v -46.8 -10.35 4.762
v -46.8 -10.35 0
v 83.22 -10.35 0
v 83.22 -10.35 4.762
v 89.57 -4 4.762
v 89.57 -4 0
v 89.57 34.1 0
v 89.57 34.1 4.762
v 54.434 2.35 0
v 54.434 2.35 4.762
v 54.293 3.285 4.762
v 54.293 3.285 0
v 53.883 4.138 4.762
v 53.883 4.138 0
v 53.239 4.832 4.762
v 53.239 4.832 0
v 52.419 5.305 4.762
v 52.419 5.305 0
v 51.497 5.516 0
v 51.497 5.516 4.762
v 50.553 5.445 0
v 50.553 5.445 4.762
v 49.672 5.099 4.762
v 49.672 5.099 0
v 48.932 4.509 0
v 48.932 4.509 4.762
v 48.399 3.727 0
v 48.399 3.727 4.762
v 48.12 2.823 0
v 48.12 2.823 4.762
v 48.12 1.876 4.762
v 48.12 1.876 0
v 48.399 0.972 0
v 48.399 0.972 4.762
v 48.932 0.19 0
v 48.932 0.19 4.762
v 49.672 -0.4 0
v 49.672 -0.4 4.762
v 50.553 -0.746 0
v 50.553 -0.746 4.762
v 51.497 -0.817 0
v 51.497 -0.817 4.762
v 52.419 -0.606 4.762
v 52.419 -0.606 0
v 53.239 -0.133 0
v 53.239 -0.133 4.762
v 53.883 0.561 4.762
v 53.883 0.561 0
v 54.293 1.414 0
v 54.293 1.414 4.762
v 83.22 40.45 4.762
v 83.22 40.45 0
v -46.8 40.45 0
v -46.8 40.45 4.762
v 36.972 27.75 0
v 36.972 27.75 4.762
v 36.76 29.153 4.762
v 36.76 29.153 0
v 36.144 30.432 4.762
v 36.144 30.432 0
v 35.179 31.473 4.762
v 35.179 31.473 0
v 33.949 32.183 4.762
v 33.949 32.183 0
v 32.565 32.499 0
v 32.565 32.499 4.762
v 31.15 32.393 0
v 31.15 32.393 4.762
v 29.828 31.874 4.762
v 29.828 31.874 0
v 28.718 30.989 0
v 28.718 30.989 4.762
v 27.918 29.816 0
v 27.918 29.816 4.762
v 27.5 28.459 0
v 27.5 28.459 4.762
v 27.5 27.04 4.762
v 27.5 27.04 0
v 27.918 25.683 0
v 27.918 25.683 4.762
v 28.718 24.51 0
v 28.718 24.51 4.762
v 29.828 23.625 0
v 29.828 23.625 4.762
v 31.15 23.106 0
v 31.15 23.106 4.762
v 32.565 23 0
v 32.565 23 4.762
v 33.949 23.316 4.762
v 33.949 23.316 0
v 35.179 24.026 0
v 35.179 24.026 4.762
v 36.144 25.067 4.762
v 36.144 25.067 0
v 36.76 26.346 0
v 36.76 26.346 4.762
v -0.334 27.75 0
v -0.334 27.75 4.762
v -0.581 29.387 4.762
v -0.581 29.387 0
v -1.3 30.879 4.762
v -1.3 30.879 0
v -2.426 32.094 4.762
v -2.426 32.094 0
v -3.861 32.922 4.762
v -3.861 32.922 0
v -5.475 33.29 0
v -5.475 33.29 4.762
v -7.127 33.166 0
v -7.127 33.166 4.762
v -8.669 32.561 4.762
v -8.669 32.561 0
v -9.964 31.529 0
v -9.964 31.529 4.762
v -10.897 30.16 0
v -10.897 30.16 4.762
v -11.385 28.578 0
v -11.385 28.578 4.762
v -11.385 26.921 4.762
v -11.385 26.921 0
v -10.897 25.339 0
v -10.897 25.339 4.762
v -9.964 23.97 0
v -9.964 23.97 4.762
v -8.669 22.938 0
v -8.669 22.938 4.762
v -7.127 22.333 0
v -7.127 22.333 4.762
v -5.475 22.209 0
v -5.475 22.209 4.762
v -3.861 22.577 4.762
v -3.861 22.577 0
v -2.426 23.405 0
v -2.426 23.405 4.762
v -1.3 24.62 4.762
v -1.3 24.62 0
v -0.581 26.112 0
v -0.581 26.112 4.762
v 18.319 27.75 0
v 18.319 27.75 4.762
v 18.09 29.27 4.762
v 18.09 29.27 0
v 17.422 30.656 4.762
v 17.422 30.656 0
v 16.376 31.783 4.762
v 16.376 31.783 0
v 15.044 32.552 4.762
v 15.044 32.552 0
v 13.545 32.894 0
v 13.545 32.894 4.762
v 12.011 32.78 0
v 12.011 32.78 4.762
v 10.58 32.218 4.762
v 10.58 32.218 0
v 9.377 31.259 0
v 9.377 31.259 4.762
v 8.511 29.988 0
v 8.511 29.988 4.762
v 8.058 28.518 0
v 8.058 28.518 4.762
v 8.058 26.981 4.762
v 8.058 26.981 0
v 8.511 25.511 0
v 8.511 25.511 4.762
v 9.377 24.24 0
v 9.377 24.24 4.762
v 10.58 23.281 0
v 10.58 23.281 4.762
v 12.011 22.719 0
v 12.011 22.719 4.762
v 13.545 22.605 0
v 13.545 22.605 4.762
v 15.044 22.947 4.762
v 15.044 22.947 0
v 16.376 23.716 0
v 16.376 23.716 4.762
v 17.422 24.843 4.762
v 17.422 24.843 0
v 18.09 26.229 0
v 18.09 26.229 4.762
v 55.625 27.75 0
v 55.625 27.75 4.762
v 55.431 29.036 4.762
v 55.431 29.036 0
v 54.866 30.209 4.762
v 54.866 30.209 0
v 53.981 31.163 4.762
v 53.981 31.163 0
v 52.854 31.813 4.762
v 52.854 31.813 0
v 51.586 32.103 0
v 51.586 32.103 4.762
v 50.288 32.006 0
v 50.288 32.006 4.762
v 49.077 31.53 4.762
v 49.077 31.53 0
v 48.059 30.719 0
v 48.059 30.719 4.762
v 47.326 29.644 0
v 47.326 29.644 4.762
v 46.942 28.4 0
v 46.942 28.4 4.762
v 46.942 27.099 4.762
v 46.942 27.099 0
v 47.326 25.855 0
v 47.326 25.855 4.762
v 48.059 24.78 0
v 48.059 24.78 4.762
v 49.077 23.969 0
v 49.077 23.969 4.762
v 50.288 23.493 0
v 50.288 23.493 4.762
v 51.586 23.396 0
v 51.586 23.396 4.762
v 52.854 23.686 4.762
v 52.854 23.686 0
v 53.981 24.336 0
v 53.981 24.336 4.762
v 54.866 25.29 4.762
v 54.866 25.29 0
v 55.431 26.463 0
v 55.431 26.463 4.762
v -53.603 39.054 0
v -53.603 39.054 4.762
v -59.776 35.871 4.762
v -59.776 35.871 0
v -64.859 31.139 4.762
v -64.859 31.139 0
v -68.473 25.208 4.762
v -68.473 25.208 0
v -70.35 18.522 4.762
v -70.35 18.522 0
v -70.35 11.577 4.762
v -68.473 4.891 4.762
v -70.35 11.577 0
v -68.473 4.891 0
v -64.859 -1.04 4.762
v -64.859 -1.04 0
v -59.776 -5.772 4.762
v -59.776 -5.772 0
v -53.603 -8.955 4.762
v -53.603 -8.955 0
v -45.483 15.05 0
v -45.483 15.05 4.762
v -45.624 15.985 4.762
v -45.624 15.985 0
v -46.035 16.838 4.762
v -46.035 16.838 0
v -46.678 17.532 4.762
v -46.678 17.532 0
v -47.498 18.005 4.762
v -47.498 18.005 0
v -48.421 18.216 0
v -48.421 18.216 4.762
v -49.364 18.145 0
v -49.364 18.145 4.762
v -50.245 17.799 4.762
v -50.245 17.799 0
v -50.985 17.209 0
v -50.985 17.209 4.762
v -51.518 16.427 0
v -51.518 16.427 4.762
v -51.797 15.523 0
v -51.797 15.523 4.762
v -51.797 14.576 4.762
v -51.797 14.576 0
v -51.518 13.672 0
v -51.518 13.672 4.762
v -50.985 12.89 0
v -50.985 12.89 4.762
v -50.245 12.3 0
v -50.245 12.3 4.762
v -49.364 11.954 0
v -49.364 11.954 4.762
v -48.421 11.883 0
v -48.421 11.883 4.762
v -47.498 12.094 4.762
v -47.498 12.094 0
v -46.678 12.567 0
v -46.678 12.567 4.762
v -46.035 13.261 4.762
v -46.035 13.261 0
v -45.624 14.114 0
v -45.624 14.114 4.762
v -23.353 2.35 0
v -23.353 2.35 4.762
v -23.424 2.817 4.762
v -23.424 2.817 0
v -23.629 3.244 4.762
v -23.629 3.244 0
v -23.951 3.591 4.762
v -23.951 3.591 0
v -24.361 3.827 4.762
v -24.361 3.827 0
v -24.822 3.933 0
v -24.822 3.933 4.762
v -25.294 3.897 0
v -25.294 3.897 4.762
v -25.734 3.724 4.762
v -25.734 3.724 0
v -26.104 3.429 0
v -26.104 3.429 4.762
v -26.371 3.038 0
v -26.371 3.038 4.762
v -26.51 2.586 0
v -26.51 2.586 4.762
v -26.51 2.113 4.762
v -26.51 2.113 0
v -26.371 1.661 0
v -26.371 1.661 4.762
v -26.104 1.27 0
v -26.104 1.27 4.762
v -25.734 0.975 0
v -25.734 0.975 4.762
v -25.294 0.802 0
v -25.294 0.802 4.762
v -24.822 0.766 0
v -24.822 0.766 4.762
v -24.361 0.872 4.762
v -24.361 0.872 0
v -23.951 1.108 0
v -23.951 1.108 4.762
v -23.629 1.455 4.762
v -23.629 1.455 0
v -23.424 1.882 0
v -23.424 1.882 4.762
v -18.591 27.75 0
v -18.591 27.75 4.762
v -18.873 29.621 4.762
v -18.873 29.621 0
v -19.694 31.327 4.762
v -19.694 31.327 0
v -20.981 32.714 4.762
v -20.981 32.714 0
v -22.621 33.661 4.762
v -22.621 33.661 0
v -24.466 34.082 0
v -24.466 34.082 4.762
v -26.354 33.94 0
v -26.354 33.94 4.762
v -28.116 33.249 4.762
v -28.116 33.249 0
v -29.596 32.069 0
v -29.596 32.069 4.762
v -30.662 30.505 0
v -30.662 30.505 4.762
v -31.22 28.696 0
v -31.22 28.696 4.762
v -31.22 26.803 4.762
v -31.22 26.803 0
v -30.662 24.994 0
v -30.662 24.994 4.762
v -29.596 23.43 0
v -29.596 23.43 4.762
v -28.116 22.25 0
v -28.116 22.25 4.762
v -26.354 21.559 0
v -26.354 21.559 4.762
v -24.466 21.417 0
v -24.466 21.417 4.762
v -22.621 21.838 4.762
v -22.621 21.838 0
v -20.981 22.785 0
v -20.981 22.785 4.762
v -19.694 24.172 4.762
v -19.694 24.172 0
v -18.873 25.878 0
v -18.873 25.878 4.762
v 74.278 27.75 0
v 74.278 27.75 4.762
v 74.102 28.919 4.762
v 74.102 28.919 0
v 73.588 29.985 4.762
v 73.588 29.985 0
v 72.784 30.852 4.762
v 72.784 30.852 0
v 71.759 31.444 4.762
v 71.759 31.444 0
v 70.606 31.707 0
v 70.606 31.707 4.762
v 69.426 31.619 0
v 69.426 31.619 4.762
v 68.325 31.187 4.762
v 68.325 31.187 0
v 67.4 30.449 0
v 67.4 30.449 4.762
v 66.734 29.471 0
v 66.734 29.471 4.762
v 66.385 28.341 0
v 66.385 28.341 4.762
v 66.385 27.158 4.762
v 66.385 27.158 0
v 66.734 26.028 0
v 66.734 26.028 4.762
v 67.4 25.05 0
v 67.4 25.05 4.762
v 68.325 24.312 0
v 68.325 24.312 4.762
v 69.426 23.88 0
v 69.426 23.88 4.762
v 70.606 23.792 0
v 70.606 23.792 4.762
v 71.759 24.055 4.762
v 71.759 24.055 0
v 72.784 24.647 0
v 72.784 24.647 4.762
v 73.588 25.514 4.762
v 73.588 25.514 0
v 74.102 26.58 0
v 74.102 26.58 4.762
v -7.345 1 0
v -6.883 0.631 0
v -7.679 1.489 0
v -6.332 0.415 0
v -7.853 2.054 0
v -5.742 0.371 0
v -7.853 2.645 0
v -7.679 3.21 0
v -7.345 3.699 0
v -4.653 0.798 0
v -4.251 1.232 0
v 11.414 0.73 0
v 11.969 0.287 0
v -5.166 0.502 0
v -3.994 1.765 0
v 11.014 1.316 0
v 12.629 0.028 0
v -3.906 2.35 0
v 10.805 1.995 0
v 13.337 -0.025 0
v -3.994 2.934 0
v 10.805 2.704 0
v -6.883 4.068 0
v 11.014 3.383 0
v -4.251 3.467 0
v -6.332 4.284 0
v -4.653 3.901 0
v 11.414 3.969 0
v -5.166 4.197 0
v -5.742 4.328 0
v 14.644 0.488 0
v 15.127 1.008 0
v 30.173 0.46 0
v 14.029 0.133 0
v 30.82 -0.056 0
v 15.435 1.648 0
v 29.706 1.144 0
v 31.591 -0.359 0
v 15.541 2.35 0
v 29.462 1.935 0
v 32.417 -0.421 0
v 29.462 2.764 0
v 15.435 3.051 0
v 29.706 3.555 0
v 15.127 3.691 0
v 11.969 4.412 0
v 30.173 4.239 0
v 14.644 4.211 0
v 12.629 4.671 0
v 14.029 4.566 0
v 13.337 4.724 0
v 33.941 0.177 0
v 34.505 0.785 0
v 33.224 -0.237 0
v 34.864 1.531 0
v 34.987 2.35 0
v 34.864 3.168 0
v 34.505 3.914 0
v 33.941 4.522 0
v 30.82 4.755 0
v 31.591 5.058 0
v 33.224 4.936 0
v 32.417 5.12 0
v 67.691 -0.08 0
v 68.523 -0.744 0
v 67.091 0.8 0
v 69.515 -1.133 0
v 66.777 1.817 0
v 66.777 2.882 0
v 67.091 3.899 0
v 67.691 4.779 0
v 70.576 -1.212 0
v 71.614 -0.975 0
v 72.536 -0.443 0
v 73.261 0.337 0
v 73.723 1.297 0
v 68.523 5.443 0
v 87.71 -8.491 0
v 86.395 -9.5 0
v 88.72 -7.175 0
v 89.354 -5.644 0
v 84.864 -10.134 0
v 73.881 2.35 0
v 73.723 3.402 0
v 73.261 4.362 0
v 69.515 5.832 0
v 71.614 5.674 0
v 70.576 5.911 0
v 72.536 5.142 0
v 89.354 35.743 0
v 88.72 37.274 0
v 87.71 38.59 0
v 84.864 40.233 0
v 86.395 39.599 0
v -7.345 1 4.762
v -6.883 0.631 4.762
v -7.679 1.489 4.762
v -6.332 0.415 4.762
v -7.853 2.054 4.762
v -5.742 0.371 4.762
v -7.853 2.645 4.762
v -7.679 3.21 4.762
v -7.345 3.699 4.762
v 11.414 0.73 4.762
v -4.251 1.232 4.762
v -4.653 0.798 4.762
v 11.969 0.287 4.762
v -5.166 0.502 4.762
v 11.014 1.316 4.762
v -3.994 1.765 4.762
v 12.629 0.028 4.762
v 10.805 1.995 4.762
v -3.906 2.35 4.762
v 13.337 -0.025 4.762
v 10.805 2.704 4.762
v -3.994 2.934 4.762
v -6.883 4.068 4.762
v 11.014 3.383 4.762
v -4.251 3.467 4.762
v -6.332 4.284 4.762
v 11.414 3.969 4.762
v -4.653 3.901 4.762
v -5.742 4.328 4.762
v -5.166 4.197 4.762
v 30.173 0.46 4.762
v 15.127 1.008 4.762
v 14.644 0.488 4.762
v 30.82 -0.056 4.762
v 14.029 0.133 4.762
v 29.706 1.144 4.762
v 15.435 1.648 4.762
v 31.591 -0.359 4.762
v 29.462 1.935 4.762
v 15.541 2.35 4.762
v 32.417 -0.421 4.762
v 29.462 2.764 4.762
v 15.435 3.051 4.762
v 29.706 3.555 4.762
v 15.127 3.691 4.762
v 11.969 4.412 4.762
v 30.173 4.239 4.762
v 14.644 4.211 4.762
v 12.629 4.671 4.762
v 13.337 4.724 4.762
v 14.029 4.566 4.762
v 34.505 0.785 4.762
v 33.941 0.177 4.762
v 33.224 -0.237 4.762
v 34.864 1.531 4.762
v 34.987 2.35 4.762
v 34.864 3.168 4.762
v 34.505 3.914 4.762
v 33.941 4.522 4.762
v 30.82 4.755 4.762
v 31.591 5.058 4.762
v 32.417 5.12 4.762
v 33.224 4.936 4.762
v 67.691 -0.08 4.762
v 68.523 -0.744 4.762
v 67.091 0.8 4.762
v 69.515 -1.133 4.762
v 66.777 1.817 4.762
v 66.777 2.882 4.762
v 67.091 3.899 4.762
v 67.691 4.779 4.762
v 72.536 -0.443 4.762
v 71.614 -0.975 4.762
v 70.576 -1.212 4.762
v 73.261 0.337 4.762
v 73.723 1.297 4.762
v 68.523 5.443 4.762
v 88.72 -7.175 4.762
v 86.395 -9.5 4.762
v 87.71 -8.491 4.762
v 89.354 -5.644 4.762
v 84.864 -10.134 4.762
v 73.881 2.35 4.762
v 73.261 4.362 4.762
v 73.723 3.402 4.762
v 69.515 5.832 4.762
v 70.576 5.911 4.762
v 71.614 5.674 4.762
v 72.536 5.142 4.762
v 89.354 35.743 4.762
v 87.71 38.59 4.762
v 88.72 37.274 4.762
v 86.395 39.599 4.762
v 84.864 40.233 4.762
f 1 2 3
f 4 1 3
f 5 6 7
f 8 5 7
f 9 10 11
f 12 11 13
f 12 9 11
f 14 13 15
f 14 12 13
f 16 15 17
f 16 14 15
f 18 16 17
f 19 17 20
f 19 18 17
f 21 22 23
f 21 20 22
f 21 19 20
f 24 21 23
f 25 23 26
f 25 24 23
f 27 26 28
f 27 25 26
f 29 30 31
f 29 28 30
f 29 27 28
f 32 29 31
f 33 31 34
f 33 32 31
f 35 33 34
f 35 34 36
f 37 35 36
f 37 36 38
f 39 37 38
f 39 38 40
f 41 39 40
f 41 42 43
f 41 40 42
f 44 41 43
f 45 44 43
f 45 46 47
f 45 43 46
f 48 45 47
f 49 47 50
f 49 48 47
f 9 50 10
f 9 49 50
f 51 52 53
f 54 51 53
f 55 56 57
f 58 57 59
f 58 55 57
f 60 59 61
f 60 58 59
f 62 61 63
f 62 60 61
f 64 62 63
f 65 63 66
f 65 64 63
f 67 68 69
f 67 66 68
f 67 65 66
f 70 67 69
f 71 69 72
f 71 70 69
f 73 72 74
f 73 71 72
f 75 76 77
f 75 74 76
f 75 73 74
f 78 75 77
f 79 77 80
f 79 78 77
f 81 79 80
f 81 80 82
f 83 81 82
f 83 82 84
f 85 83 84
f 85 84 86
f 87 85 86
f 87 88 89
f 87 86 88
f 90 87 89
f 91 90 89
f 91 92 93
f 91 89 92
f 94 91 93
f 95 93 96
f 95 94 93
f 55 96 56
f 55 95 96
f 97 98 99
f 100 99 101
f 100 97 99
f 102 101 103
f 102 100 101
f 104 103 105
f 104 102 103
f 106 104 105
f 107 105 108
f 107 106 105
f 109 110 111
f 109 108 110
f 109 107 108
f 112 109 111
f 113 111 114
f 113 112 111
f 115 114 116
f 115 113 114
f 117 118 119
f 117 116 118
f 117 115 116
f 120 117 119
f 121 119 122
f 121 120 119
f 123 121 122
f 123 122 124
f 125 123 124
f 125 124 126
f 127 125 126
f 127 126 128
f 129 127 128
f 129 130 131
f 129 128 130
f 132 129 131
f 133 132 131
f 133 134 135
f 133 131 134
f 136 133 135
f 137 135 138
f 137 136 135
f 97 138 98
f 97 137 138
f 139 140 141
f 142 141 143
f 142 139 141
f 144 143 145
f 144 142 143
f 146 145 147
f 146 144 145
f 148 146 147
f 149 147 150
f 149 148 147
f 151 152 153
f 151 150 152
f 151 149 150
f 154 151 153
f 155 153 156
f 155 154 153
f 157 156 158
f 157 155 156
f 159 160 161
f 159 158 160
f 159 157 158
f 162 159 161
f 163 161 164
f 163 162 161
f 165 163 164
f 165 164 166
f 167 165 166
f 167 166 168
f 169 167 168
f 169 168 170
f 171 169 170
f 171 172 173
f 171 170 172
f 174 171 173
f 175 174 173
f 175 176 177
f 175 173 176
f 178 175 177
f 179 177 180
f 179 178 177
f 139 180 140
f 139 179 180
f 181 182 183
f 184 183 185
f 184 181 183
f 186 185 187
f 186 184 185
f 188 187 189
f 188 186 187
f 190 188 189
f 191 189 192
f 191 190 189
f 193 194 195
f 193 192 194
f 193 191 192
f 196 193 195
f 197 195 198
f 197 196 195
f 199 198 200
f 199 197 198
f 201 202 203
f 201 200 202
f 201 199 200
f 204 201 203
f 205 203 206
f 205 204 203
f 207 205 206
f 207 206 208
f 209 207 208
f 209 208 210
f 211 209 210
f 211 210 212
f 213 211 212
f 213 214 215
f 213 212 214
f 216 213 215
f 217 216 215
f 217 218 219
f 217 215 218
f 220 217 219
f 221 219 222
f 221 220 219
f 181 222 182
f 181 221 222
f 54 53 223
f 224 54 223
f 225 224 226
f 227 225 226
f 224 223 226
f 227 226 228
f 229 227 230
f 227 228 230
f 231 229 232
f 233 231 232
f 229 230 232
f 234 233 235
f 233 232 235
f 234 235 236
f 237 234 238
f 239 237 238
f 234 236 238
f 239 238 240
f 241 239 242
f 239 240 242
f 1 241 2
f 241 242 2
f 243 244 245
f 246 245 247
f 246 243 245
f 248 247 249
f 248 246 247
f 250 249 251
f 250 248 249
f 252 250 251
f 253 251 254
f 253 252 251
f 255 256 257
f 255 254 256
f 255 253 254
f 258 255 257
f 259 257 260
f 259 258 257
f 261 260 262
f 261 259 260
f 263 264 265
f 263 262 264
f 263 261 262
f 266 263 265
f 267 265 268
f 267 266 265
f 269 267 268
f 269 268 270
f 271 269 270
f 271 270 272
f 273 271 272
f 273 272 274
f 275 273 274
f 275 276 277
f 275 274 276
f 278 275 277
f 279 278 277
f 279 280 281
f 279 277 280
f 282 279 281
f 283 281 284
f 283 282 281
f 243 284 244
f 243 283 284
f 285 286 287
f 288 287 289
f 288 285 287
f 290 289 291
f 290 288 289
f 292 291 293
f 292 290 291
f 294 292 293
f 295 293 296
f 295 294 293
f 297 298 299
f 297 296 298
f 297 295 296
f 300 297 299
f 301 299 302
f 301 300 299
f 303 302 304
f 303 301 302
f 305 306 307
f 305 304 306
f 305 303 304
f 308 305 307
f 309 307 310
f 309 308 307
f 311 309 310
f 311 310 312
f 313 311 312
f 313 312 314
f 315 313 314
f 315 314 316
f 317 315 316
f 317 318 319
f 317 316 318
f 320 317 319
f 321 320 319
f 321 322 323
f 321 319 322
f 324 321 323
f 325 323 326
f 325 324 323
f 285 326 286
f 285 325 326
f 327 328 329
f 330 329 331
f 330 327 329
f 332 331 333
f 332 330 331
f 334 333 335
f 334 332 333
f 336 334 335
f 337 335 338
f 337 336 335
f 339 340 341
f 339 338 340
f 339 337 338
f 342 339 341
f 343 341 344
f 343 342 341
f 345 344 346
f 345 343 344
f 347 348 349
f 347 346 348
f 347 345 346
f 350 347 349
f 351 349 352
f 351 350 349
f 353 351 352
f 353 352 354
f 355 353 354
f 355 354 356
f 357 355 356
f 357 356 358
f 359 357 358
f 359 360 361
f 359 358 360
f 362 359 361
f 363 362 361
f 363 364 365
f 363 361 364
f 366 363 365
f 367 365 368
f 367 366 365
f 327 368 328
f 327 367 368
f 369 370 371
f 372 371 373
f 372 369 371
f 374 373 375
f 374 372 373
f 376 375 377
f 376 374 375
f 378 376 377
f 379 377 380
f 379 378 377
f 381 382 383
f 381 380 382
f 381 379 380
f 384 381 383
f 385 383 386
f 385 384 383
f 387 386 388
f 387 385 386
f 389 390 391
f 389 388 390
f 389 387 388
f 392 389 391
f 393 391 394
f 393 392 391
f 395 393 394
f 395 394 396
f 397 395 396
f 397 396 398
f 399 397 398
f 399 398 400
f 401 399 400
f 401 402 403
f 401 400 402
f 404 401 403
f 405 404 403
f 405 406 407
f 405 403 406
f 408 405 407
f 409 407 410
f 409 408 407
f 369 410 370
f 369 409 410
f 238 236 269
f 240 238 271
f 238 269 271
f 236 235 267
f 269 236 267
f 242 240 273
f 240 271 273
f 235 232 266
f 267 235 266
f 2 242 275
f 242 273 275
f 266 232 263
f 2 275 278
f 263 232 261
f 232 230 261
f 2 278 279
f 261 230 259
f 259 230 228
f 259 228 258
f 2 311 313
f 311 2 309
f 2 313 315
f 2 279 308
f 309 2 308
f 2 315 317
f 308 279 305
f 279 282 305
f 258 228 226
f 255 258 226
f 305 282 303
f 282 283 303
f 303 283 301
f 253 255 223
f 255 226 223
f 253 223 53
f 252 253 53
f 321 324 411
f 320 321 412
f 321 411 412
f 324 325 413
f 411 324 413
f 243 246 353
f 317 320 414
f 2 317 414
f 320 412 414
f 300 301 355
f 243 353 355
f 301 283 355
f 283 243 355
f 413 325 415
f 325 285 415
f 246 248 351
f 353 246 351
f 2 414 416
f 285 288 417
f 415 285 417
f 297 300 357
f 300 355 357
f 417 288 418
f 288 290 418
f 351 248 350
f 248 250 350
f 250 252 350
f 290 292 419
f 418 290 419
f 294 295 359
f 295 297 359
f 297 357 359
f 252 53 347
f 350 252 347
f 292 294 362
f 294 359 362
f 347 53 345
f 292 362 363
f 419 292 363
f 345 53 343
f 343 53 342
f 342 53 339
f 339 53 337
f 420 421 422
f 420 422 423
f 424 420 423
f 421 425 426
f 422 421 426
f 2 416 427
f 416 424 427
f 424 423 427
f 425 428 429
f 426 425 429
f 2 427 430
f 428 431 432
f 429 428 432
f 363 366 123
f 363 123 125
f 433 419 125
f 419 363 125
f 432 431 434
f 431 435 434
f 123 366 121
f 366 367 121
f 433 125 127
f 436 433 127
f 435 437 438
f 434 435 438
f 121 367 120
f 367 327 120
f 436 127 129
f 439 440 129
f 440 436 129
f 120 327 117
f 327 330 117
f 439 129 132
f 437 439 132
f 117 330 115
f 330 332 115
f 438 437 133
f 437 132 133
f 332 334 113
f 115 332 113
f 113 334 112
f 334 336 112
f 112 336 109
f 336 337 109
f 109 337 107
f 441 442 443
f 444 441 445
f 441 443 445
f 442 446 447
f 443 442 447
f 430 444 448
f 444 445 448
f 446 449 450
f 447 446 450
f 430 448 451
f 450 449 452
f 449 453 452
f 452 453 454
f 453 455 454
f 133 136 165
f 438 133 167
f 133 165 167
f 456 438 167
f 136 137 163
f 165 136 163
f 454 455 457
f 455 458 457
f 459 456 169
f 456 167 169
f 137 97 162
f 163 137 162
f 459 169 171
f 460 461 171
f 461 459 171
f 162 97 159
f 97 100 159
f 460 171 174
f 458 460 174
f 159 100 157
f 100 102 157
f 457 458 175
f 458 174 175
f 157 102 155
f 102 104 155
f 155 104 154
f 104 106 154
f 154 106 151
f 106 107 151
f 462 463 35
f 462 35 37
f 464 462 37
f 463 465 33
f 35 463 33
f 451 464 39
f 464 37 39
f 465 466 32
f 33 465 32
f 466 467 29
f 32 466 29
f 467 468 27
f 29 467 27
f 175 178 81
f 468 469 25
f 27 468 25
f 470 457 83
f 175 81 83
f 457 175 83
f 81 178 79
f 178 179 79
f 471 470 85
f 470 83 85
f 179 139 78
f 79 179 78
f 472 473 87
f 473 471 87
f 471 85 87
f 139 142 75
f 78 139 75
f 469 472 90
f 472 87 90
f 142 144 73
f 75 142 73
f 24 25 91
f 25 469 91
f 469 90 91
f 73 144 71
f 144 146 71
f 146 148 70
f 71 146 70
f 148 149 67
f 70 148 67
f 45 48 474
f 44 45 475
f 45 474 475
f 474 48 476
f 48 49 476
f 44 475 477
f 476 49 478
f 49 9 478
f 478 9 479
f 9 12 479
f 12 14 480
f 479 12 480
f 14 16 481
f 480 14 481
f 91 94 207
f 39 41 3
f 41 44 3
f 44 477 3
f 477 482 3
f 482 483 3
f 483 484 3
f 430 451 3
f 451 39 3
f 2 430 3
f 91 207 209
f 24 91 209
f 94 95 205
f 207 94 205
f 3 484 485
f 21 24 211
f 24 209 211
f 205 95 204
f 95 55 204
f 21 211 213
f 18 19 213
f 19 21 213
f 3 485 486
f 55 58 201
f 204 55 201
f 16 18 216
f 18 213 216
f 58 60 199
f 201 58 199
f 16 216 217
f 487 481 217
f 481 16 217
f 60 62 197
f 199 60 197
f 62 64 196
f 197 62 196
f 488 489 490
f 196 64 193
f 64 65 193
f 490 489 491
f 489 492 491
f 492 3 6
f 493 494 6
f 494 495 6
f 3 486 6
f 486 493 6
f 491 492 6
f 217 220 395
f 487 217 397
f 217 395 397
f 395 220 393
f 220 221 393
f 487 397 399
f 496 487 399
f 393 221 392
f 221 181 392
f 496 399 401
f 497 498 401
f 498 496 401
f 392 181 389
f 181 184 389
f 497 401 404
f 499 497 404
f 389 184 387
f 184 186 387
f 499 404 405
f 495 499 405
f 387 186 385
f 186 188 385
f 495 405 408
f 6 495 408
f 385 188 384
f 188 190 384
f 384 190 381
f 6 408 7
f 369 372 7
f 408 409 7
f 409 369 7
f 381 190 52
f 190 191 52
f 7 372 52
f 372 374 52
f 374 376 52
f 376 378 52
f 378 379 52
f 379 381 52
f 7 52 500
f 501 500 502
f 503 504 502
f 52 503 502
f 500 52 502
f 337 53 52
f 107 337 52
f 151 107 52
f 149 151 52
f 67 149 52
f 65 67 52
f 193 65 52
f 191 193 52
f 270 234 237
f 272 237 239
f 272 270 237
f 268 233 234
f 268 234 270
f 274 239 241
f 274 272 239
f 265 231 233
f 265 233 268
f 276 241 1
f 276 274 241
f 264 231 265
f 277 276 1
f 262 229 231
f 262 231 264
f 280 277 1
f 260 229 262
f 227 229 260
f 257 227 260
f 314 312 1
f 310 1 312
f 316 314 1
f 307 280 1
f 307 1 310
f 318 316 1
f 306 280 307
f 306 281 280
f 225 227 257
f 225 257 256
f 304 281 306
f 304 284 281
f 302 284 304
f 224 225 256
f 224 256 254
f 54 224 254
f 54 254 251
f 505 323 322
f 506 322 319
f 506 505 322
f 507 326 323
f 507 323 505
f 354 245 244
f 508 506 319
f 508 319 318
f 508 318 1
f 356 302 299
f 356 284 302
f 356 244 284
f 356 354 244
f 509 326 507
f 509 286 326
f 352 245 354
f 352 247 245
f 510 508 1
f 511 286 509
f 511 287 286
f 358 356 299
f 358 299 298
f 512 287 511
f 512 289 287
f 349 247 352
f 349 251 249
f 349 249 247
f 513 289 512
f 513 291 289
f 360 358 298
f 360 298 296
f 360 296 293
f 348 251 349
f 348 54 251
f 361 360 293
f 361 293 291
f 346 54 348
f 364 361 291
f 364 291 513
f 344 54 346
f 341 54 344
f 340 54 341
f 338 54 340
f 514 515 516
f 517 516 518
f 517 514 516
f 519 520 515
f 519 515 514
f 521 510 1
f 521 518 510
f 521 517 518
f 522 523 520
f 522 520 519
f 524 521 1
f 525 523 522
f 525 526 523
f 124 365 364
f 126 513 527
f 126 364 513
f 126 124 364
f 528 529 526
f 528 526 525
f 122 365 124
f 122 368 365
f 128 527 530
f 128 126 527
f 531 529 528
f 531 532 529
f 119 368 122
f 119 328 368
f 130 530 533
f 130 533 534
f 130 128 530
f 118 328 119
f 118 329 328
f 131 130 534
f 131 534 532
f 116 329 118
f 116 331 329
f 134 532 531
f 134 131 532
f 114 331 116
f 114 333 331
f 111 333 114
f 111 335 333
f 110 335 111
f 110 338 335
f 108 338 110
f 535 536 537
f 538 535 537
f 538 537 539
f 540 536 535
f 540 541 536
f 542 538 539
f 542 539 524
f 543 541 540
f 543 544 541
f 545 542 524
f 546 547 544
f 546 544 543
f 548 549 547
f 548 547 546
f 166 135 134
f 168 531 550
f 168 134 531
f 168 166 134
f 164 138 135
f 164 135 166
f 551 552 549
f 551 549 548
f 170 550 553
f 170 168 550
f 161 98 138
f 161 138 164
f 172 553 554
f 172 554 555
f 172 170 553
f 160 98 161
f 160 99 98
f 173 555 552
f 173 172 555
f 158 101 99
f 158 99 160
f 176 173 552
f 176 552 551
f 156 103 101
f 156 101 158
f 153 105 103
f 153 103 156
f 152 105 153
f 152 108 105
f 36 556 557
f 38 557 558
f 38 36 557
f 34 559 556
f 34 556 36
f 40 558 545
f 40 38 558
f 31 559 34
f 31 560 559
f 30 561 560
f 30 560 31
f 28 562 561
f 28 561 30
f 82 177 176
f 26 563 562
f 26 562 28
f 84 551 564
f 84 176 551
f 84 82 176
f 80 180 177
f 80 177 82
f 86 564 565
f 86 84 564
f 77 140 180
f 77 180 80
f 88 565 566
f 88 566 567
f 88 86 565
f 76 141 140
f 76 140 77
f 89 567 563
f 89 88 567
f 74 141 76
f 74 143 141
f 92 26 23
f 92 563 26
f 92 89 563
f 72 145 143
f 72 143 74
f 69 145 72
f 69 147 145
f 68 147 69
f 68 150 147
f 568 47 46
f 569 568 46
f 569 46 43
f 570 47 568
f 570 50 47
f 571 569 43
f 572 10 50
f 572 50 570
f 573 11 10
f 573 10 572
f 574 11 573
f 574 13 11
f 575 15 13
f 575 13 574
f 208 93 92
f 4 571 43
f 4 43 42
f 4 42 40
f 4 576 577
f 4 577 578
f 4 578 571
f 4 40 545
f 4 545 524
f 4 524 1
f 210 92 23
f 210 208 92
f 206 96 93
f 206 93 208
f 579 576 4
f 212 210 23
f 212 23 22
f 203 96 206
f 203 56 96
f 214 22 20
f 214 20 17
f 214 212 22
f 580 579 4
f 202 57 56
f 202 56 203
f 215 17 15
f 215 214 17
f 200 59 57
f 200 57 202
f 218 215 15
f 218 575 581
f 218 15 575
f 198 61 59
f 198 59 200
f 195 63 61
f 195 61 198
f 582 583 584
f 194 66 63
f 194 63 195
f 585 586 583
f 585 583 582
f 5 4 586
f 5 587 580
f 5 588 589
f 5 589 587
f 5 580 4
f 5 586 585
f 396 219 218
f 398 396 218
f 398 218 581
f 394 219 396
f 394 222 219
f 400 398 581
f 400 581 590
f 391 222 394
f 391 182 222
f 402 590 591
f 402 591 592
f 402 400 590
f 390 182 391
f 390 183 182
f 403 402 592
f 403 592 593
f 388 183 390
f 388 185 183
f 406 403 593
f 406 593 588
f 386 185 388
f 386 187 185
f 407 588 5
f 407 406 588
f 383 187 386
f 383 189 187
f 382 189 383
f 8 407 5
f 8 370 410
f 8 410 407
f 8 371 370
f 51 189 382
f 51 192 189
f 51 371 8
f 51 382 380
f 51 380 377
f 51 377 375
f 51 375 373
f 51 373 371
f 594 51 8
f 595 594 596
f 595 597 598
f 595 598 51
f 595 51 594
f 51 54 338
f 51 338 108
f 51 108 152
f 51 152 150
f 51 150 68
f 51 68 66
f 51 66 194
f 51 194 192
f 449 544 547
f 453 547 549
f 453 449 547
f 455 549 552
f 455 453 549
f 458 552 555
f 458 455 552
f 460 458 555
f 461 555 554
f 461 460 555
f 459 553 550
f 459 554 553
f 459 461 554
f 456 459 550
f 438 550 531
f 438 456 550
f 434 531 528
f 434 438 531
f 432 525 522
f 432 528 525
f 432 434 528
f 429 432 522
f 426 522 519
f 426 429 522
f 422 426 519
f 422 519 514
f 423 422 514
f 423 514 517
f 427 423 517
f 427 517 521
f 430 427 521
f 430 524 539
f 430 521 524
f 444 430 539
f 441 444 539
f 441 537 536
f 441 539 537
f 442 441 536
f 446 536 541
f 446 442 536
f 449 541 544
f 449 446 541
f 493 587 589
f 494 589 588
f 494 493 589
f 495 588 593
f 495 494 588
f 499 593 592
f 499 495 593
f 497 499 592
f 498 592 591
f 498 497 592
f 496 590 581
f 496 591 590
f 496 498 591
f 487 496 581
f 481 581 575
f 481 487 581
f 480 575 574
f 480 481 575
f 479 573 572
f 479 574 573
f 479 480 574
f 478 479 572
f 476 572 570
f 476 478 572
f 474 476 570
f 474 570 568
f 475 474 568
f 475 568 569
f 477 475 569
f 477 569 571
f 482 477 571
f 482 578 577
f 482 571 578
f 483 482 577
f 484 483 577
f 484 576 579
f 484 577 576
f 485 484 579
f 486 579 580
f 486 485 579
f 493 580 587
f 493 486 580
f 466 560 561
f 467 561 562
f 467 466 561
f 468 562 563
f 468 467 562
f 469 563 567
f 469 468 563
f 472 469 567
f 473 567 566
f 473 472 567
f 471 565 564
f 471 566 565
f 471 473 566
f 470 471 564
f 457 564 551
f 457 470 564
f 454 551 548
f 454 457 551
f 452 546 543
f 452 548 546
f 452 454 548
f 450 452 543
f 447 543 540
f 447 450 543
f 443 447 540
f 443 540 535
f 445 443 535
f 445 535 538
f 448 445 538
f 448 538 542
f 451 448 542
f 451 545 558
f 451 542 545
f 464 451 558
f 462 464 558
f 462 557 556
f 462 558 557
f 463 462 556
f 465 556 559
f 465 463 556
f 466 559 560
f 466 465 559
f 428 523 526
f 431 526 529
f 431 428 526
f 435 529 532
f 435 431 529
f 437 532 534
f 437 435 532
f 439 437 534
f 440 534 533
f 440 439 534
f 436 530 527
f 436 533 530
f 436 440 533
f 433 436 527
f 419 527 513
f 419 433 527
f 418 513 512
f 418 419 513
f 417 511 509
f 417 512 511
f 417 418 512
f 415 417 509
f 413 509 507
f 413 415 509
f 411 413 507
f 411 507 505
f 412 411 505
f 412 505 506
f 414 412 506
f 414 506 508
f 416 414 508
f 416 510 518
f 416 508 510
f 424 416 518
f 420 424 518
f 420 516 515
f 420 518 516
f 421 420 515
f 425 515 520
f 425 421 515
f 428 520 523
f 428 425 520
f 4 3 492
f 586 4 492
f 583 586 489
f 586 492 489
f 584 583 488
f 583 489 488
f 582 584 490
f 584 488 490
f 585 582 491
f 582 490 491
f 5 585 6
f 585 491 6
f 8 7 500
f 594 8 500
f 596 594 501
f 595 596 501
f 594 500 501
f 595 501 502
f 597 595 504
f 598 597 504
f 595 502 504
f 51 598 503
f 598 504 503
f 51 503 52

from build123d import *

# Parameters (mm, degrees)
F2_DEPTH = 4.7625
F1_R     = 6.35
F1_R_2   = 1.5875
F1_R_3   = 3.175
F1_R_4   = 5.55625
F1_R_5   = 5.159375
F1_R_6   = 4.7625
F1_R_7   = 4.365625
F1_R_8   = 3.96875
F1_R_9   = 3.571875
F1_R_10  = 2.778125
F1_R_11  = 2.38125
F1_R_12  = 1.984375
F3_DEPTH = 35.56


with BuildPart() as f2:
    # F0 (on Top) → F2 (new body)
    with BuildSketch(Plane.XY):
        with BuildLine():
            Line((83.220267, 40.4495), (-46.799858, 40.4495))
            ThreePointArc((-46.799858, 40.4495), (-70.588232, 15.0495), (-46.799858, -10.3505))
            Line((-46.799858, -10.3505), (83.220267, -10.3505))
            ThreePointArc((83.220267, -10.3505), (87.710395, -8.490628), (89.570267, -4.0005))
            Line((89.570267, -4.0005), (89.570267, 34.0995))
            ThreePointArc((89.570267, 34.0995), (87.710395, 38.589628), (83.220267, 40.4495))
        make_face()
    extrude(amount=F2_DEPTH)

    # F1 (on face) → F3 (cut)
    with BuildSketch(Plane.XY):
        with Locations((-24.940642, 27.7495)):
            Circle(F1_R)
        with Locations((-24.940642, 2.3495)):
            Circle(F1_R_2)
        with Locations((-48.657889, 15.0495)):
            Circle(F1_R_3)
        with Locations((-5.890642, 27.7495)):
            Circle(F1_R_4)
        with Locations((13.159358, 27.7495)):
            Circle(F1_R_5)
        with Locations((32.209358, 27.7495)):
            Circle(F1_R_6)
        with Locations((51.259358, 27.7495)):
            Circle(F1_R_7)
        with Locations((70.309358, 27.7495)):
            Circle(F1_R_8)
        with Locations((70.309358, 2.3495)):
            Circle(F1_R_9)
        with Locations((51.259358, 2.3495)):
            Circle(F1_R_3)
        with Locations((32.209358, 2.3495)):
            Circle(F1_R_10)
        with Locations((13.159358, 2.3495)):
            Circle(F1_R_11)
        with Locations((-5.890642, 2.3495)):
            Circle(F1_R_12)
    extrude(amount=F3_DEPTH, mode=Mode.SUBTRACT)


solid = f2.part
